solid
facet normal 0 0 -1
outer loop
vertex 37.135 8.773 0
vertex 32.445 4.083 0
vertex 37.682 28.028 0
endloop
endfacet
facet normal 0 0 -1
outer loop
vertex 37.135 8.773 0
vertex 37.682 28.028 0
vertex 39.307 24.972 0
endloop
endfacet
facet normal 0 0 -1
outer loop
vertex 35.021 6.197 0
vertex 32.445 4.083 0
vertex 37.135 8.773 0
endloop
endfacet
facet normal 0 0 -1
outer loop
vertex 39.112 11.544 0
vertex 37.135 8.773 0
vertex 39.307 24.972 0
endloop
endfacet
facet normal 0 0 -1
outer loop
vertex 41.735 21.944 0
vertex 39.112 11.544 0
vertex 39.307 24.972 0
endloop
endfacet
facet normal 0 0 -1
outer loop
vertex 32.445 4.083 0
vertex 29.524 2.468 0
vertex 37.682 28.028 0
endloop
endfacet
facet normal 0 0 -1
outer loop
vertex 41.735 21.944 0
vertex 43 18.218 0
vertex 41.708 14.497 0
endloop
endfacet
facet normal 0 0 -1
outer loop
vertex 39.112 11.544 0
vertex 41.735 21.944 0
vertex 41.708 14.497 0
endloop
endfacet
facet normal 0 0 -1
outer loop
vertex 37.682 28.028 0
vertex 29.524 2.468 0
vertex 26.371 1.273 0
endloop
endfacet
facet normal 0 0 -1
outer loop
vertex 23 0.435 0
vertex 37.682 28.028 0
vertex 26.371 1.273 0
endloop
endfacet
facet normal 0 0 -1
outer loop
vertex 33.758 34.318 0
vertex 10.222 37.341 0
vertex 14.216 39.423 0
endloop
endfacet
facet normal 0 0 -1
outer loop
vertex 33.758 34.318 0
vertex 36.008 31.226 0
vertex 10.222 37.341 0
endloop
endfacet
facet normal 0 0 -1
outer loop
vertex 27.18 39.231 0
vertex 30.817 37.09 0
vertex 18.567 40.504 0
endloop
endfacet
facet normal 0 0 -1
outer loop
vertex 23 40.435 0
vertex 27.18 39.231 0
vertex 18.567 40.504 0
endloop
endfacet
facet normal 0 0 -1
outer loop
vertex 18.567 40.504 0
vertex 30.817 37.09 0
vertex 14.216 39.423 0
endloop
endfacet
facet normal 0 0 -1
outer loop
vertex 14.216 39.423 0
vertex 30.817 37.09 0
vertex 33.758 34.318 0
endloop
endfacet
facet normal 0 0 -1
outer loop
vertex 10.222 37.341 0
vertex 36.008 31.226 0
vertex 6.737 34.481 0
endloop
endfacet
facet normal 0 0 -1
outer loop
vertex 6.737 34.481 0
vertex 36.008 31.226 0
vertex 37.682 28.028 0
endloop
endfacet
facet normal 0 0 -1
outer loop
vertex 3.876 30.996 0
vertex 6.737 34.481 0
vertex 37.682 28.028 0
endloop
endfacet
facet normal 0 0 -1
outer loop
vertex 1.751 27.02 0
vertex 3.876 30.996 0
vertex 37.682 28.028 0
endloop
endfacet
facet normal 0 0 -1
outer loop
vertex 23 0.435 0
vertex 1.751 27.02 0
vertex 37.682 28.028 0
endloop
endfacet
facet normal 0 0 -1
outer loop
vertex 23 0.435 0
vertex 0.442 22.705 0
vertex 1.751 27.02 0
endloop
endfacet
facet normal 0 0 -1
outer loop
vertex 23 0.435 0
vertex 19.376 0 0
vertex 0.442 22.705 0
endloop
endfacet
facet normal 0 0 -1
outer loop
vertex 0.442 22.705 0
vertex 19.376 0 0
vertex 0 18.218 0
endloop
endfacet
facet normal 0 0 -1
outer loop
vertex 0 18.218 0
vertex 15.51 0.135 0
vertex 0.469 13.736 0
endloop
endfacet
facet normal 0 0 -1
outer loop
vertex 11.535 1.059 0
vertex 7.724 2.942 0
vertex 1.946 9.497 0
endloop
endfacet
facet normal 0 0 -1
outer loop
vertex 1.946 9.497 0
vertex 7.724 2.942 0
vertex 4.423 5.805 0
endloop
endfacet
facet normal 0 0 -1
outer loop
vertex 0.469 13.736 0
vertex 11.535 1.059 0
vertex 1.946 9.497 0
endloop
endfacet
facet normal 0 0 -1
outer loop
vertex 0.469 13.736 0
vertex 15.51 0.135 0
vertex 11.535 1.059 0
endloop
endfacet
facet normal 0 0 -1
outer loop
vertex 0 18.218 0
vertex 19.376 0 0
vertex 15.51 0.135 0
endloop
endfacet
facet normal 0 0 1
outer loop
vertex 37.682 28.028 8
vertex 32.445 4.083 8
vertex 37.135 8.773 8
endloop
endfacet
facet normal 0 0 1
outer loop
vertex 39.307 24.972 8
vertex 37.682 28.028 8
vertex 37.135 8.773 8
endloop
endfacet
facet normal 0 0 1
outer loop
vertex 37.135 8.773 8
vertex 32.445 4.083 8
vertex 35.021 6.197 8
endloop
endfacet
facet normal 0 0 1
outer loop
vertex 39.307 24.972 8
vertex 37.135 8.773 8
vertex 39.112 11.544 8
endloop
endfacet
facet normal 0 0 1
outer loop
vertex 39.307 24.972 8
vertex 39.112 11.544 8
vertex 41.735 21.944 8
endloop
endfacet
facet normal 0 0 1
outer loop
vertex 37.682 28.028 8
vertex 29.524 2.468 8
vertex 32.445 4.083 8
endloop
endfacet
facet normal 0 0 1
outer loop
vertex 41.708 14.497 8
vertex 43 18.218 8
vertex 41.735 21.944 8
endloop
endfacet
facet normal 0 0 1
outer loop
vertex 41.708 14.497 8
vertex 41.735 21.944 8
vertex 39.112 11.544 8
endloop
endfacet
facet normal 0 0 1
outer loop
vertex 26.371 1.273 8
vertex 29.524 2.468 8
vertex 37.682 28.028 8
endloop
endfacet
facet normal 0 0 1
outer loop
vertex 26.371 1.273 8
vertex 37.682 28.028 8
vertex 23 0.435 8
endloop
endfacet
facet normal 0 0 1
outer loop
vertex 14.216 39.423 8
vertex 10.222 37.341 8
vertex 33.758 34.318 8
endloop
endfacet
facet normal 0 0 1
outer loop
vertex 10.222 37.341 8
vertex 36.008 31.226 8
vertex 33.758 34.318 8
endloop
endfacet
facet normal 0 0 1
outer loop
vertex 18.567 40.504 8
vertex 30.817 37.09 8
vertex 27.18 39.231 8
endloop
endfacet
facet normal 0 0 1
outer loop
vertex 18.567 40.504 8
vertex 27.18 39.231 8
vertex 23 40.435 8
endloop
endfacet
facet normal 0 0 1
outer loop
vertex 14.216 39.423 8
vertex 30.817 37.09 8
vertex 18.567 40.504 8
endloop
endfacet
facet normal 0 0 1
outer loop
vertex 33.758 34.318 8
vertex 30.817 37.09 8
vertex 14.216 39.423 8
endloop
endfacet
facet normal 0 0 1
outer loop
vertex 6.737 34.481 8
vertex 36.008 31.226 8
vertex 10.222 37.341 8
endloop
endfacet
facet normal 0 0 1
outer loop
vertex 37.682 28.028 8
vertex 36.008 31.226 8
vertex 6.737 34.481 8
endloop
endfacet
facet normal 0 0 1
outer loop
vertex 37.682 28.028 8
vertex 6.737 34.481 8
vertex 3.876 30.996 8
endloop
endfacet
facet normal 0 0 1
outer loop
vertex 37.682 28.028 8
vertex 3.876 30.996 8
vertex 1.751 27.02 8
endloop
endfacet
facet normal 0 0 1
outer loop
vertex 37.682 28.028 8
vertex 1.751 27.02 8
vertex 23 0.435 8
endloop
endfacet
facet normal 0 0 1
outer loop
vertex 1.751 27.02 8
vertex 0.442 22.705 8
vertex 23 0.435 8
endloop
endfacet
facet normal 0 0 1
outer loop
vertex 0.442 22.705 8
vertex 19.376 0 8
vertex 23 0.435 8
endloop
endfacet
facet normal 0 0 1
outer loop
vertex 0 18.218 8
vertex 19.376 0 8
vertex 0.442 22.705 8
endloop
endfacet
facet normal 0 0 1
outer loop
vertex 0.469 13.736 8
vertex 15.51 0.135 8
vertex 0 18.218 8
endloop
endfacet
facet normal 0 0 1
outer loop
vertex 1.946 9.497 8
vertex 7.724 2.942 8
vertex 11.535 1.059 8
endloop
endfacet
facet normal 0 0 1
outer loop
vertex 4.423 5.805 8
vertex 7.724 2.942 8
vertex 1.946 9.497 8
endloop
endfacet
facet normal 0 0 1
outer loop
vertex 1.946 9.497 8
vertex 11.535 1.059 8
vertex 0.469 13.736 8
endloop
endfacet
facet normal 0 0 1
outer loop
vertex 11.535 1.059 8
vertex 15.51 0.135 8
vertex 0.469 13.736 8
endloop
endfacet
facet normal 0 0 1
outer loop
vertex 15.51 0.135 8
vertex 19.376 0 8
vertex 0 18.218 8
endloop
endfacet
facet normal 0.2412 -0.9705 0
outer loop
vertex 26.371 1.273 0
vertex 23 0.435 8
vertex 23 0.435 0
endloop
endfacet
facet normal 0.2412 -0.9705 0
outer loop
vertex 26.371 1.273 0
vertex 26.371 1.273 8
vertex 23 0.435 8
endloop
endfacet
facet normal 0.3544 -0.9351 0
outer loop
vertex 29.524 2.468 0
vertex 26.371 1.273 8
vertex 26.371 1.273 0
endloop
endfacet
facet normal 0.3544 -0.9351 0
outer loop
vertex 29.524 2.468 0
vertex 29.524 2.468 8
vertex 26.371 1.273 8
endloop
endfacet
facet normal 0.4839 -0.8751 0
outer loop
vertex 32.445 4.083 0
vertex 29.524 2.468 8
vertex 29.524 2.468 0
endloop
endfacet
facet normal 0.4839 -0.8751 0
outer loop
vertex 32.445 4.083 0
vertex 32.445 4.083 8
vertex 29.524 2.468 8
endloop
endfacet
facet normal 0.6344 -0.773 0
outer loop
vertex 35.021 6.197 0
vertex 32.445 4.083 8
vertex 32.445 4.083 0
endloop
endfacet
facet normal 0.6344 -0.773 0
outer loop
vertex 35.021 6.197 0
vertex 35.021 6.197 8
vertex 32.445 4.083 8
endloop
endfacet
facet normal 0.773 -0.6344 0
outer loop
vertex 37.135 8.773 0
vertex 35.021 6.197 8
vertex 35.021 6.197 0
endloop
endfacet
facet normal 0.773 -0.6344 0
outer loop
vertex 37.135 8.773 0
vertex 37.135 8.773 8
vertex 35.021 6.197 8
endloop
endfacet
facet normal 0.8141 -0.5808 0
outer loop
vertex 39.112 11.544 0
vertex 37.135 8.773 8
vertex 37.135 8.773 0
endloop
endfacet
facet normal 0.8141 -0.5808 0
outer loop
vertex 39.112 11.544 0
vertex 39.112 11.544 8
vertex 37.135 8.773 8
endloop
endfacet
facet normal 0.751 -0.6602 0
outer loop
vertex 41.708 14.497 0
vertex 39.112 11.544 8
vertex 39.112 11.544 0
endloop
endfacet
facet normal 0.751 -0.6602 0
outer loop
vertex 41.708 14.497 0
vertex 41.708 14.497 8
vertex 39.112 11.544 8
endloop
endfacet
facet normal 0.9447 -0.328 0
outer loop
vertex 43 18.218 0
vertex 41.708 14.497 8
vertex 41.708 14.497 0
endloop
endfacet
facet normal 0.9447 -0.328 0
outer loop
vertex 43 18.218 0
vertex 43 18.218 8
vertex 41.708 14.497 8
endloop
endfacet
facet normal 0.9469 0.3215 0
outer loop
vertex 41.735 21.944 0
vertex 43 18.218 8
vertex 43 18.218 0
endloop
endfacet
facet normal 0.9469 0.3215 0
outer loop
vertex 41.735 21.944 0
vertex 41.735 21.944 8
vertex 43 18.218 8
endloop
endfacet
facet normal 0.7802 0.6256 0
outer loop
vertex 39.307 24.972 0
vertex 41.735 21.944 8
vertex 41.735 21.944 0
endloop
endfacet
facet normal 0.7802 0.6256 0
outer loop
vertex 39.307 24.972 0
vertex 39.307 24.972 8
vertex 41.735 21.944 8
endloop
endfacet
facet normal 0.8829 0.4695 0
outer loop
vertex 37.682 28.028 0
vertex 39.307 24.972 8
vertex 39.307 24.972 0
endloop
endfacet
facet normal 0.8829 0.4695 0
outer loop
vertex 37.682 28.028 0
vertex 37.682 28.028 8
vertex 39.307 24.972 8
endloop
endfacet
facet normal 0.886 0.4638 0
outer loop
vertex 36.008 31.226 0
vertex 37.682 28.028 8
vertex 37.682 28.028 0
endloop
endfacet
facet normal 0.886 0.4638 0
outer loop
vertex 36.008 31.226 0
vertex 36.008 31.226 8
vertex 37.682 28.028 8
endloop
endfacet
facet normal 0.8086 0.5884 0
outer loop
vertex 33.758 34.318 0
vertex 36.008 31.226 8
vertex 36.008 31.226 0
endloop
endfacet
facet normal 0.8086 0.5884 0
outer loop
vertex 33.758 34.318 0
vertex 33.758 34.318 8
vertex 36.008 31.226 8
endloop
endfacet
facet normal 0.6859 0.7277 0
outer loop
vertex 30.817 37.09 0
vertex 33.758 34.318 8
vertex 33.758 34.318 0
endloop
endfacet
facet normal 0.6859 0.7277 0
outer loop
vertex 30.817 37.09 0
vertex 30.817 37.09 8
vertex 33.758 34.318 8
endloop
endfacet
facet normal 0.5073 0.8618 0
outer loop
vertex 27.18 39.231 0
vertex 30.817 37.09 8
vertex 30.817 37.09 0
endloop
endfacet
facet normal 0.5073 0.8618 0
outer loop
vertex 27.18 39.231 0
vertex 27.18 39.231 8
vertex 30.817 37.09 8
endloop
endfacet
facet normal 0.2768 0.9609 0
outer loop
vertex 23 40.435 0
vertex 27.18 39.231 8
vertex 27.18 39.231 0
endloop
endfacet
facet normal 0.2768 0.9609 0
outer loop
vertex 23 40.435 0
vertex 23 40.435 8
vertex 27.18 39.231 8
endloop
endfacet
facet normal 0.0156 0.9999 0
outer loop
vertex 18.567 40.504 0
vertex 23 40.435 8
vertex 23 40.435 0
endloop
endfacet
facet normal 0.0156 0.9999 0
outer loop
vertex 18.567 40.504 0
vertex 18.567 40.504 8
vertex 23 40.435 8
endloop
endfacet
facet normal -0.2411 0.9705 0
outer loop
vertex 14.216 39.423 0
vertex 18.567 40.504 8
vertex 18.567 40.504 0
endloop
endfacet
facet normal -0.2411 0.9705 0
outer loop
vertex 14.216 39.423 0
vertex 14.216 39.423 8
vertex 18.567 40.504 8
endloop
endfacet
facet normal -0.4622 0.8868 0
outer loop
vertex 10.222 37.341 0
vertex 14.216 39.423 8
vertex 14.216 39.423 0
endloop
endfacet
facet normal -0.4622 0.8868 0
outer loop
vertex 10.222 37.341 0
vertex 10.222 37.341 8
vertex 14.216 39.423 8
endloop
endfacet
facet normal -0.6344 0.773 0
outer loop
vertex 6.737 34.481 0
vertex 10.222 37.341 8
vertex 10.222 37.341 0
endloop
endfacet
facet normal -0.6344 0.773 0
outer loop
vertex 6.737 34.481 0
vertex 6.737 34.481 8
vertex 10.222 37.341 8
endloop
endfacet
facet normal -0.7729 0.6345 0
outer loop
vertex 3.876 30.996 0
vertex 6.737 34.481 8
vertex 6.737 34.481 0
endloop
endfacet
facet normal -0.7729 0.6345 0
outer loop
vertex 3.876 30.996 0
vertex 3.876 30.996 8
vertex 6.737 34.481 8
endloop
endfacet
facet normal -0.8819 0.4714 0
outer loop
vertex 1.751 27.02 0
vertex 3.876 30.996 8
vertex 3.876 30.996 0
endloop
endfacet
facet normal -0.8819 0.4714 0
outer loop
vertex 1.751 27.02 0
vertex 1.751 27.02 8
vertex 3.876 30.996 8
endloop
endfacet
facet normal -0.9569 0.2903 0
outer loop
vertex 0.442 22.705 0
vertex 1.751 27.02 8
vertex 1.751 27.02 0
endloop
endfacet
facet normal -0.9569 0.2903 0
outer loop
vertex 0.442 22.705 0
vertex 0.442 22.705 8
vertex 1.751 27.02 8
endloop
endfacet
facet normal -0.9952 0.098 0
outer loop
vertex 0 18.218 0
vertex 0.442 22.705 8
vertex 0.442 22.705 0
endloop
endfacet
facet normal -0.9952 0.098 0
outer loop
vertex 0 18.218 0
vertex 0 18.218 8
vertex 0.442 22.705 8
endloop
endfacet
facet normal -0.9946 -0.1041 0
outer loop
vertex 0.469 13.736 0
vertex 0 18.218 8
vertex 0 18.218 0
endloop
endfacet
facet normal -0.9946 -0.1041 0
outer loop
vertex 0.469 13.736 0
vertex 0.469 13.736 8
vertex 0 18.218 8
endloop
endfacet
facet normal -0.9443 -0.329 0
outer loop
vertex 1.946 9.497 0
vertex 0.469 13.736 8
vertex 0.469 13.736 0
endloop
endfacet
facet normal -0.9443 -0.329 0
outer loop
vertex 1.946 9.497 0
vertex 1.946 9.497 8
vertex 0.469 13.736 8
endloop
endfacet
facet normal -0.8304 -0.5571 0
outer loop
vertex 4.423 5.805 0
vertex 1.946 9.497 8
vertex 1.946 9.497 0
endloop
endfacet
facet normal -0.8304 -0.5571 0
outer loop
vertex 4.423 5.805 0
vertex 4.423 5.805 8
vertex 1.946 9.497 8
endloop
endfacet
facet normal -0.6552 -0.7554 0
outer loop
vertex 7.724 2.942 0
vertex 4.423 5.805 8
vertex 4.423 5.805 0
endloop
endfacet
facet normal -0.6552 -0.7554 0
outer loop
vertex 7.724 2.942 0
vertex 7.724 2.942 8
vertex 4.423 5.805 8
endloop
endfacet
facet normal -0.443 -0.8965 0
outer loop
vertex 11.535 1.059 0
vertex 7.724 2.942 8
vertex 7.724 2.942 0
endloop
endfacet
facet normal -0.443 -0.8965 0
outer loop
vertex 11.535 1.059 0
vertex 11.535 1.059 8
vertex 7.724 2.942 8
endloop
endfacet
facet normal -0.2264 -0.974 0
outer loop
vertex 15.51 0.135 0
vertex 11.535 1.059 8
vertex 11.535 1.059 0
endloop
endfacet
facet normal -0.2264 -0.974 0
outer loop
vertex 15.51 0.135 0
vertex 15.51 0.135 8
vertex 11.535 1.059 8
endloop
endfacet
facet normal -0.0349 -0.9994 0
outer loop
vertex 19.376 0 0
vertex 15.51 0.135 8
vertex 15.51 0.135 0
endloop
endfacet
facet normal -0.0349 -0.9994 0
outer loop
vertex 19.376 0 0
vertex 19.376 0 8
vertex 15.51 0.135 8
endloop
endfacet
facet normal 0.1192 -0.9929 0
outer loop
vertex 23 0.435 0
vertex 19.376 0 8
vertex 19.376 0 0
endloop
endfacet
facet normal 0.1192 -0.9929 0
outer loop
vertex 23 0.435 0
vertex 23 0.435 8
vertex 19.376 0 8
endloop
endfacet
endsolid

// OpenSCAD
$fn = 32;

// ----------------------------------------------------------------------
// Cam disc: base radius 17.0 mm, lift 6.0 mm, 32 profile points
// ----------------------------------------------------------------------

// --- parameters (mm) ---
profile_height = 8;       // extrusion height
profile_points = 32;      // points of the closed outline

profile = [[43, 18.218], [41.735, 21.944], [39.307, 24.972], [37.682, 28.028], [36.008, 31.226], [33.758, 34.318], [30.817, 37.09], [27.18, 39.231], [23, 40.435], [18.567, 40.504], [14.216, 39.423], [10.222, 37.341], [6.737, 34.481], [3.876, 30.996], [1.751, 27.02], [0.442, 22.705], [0, 18.218], [0.469, 13.736], [1.946, 9.497], [4.423, 5.805], [7.724, 2.942], [11.535, 1.059], [15.51, 0.135], [19.376, 0], [23, 0.435], [26.371, 1.273], [29.524, 2.468], [32.445, 4.083], [35.021, 6.197], [37.135, 8.773], [39.112, 11.544], [41.708, 14.497]];  // single closed polygon, 32 points, counter clockwise

// --- the one profile operation ---
linear_extrude(height = profile_height) polygon(points = profile);
